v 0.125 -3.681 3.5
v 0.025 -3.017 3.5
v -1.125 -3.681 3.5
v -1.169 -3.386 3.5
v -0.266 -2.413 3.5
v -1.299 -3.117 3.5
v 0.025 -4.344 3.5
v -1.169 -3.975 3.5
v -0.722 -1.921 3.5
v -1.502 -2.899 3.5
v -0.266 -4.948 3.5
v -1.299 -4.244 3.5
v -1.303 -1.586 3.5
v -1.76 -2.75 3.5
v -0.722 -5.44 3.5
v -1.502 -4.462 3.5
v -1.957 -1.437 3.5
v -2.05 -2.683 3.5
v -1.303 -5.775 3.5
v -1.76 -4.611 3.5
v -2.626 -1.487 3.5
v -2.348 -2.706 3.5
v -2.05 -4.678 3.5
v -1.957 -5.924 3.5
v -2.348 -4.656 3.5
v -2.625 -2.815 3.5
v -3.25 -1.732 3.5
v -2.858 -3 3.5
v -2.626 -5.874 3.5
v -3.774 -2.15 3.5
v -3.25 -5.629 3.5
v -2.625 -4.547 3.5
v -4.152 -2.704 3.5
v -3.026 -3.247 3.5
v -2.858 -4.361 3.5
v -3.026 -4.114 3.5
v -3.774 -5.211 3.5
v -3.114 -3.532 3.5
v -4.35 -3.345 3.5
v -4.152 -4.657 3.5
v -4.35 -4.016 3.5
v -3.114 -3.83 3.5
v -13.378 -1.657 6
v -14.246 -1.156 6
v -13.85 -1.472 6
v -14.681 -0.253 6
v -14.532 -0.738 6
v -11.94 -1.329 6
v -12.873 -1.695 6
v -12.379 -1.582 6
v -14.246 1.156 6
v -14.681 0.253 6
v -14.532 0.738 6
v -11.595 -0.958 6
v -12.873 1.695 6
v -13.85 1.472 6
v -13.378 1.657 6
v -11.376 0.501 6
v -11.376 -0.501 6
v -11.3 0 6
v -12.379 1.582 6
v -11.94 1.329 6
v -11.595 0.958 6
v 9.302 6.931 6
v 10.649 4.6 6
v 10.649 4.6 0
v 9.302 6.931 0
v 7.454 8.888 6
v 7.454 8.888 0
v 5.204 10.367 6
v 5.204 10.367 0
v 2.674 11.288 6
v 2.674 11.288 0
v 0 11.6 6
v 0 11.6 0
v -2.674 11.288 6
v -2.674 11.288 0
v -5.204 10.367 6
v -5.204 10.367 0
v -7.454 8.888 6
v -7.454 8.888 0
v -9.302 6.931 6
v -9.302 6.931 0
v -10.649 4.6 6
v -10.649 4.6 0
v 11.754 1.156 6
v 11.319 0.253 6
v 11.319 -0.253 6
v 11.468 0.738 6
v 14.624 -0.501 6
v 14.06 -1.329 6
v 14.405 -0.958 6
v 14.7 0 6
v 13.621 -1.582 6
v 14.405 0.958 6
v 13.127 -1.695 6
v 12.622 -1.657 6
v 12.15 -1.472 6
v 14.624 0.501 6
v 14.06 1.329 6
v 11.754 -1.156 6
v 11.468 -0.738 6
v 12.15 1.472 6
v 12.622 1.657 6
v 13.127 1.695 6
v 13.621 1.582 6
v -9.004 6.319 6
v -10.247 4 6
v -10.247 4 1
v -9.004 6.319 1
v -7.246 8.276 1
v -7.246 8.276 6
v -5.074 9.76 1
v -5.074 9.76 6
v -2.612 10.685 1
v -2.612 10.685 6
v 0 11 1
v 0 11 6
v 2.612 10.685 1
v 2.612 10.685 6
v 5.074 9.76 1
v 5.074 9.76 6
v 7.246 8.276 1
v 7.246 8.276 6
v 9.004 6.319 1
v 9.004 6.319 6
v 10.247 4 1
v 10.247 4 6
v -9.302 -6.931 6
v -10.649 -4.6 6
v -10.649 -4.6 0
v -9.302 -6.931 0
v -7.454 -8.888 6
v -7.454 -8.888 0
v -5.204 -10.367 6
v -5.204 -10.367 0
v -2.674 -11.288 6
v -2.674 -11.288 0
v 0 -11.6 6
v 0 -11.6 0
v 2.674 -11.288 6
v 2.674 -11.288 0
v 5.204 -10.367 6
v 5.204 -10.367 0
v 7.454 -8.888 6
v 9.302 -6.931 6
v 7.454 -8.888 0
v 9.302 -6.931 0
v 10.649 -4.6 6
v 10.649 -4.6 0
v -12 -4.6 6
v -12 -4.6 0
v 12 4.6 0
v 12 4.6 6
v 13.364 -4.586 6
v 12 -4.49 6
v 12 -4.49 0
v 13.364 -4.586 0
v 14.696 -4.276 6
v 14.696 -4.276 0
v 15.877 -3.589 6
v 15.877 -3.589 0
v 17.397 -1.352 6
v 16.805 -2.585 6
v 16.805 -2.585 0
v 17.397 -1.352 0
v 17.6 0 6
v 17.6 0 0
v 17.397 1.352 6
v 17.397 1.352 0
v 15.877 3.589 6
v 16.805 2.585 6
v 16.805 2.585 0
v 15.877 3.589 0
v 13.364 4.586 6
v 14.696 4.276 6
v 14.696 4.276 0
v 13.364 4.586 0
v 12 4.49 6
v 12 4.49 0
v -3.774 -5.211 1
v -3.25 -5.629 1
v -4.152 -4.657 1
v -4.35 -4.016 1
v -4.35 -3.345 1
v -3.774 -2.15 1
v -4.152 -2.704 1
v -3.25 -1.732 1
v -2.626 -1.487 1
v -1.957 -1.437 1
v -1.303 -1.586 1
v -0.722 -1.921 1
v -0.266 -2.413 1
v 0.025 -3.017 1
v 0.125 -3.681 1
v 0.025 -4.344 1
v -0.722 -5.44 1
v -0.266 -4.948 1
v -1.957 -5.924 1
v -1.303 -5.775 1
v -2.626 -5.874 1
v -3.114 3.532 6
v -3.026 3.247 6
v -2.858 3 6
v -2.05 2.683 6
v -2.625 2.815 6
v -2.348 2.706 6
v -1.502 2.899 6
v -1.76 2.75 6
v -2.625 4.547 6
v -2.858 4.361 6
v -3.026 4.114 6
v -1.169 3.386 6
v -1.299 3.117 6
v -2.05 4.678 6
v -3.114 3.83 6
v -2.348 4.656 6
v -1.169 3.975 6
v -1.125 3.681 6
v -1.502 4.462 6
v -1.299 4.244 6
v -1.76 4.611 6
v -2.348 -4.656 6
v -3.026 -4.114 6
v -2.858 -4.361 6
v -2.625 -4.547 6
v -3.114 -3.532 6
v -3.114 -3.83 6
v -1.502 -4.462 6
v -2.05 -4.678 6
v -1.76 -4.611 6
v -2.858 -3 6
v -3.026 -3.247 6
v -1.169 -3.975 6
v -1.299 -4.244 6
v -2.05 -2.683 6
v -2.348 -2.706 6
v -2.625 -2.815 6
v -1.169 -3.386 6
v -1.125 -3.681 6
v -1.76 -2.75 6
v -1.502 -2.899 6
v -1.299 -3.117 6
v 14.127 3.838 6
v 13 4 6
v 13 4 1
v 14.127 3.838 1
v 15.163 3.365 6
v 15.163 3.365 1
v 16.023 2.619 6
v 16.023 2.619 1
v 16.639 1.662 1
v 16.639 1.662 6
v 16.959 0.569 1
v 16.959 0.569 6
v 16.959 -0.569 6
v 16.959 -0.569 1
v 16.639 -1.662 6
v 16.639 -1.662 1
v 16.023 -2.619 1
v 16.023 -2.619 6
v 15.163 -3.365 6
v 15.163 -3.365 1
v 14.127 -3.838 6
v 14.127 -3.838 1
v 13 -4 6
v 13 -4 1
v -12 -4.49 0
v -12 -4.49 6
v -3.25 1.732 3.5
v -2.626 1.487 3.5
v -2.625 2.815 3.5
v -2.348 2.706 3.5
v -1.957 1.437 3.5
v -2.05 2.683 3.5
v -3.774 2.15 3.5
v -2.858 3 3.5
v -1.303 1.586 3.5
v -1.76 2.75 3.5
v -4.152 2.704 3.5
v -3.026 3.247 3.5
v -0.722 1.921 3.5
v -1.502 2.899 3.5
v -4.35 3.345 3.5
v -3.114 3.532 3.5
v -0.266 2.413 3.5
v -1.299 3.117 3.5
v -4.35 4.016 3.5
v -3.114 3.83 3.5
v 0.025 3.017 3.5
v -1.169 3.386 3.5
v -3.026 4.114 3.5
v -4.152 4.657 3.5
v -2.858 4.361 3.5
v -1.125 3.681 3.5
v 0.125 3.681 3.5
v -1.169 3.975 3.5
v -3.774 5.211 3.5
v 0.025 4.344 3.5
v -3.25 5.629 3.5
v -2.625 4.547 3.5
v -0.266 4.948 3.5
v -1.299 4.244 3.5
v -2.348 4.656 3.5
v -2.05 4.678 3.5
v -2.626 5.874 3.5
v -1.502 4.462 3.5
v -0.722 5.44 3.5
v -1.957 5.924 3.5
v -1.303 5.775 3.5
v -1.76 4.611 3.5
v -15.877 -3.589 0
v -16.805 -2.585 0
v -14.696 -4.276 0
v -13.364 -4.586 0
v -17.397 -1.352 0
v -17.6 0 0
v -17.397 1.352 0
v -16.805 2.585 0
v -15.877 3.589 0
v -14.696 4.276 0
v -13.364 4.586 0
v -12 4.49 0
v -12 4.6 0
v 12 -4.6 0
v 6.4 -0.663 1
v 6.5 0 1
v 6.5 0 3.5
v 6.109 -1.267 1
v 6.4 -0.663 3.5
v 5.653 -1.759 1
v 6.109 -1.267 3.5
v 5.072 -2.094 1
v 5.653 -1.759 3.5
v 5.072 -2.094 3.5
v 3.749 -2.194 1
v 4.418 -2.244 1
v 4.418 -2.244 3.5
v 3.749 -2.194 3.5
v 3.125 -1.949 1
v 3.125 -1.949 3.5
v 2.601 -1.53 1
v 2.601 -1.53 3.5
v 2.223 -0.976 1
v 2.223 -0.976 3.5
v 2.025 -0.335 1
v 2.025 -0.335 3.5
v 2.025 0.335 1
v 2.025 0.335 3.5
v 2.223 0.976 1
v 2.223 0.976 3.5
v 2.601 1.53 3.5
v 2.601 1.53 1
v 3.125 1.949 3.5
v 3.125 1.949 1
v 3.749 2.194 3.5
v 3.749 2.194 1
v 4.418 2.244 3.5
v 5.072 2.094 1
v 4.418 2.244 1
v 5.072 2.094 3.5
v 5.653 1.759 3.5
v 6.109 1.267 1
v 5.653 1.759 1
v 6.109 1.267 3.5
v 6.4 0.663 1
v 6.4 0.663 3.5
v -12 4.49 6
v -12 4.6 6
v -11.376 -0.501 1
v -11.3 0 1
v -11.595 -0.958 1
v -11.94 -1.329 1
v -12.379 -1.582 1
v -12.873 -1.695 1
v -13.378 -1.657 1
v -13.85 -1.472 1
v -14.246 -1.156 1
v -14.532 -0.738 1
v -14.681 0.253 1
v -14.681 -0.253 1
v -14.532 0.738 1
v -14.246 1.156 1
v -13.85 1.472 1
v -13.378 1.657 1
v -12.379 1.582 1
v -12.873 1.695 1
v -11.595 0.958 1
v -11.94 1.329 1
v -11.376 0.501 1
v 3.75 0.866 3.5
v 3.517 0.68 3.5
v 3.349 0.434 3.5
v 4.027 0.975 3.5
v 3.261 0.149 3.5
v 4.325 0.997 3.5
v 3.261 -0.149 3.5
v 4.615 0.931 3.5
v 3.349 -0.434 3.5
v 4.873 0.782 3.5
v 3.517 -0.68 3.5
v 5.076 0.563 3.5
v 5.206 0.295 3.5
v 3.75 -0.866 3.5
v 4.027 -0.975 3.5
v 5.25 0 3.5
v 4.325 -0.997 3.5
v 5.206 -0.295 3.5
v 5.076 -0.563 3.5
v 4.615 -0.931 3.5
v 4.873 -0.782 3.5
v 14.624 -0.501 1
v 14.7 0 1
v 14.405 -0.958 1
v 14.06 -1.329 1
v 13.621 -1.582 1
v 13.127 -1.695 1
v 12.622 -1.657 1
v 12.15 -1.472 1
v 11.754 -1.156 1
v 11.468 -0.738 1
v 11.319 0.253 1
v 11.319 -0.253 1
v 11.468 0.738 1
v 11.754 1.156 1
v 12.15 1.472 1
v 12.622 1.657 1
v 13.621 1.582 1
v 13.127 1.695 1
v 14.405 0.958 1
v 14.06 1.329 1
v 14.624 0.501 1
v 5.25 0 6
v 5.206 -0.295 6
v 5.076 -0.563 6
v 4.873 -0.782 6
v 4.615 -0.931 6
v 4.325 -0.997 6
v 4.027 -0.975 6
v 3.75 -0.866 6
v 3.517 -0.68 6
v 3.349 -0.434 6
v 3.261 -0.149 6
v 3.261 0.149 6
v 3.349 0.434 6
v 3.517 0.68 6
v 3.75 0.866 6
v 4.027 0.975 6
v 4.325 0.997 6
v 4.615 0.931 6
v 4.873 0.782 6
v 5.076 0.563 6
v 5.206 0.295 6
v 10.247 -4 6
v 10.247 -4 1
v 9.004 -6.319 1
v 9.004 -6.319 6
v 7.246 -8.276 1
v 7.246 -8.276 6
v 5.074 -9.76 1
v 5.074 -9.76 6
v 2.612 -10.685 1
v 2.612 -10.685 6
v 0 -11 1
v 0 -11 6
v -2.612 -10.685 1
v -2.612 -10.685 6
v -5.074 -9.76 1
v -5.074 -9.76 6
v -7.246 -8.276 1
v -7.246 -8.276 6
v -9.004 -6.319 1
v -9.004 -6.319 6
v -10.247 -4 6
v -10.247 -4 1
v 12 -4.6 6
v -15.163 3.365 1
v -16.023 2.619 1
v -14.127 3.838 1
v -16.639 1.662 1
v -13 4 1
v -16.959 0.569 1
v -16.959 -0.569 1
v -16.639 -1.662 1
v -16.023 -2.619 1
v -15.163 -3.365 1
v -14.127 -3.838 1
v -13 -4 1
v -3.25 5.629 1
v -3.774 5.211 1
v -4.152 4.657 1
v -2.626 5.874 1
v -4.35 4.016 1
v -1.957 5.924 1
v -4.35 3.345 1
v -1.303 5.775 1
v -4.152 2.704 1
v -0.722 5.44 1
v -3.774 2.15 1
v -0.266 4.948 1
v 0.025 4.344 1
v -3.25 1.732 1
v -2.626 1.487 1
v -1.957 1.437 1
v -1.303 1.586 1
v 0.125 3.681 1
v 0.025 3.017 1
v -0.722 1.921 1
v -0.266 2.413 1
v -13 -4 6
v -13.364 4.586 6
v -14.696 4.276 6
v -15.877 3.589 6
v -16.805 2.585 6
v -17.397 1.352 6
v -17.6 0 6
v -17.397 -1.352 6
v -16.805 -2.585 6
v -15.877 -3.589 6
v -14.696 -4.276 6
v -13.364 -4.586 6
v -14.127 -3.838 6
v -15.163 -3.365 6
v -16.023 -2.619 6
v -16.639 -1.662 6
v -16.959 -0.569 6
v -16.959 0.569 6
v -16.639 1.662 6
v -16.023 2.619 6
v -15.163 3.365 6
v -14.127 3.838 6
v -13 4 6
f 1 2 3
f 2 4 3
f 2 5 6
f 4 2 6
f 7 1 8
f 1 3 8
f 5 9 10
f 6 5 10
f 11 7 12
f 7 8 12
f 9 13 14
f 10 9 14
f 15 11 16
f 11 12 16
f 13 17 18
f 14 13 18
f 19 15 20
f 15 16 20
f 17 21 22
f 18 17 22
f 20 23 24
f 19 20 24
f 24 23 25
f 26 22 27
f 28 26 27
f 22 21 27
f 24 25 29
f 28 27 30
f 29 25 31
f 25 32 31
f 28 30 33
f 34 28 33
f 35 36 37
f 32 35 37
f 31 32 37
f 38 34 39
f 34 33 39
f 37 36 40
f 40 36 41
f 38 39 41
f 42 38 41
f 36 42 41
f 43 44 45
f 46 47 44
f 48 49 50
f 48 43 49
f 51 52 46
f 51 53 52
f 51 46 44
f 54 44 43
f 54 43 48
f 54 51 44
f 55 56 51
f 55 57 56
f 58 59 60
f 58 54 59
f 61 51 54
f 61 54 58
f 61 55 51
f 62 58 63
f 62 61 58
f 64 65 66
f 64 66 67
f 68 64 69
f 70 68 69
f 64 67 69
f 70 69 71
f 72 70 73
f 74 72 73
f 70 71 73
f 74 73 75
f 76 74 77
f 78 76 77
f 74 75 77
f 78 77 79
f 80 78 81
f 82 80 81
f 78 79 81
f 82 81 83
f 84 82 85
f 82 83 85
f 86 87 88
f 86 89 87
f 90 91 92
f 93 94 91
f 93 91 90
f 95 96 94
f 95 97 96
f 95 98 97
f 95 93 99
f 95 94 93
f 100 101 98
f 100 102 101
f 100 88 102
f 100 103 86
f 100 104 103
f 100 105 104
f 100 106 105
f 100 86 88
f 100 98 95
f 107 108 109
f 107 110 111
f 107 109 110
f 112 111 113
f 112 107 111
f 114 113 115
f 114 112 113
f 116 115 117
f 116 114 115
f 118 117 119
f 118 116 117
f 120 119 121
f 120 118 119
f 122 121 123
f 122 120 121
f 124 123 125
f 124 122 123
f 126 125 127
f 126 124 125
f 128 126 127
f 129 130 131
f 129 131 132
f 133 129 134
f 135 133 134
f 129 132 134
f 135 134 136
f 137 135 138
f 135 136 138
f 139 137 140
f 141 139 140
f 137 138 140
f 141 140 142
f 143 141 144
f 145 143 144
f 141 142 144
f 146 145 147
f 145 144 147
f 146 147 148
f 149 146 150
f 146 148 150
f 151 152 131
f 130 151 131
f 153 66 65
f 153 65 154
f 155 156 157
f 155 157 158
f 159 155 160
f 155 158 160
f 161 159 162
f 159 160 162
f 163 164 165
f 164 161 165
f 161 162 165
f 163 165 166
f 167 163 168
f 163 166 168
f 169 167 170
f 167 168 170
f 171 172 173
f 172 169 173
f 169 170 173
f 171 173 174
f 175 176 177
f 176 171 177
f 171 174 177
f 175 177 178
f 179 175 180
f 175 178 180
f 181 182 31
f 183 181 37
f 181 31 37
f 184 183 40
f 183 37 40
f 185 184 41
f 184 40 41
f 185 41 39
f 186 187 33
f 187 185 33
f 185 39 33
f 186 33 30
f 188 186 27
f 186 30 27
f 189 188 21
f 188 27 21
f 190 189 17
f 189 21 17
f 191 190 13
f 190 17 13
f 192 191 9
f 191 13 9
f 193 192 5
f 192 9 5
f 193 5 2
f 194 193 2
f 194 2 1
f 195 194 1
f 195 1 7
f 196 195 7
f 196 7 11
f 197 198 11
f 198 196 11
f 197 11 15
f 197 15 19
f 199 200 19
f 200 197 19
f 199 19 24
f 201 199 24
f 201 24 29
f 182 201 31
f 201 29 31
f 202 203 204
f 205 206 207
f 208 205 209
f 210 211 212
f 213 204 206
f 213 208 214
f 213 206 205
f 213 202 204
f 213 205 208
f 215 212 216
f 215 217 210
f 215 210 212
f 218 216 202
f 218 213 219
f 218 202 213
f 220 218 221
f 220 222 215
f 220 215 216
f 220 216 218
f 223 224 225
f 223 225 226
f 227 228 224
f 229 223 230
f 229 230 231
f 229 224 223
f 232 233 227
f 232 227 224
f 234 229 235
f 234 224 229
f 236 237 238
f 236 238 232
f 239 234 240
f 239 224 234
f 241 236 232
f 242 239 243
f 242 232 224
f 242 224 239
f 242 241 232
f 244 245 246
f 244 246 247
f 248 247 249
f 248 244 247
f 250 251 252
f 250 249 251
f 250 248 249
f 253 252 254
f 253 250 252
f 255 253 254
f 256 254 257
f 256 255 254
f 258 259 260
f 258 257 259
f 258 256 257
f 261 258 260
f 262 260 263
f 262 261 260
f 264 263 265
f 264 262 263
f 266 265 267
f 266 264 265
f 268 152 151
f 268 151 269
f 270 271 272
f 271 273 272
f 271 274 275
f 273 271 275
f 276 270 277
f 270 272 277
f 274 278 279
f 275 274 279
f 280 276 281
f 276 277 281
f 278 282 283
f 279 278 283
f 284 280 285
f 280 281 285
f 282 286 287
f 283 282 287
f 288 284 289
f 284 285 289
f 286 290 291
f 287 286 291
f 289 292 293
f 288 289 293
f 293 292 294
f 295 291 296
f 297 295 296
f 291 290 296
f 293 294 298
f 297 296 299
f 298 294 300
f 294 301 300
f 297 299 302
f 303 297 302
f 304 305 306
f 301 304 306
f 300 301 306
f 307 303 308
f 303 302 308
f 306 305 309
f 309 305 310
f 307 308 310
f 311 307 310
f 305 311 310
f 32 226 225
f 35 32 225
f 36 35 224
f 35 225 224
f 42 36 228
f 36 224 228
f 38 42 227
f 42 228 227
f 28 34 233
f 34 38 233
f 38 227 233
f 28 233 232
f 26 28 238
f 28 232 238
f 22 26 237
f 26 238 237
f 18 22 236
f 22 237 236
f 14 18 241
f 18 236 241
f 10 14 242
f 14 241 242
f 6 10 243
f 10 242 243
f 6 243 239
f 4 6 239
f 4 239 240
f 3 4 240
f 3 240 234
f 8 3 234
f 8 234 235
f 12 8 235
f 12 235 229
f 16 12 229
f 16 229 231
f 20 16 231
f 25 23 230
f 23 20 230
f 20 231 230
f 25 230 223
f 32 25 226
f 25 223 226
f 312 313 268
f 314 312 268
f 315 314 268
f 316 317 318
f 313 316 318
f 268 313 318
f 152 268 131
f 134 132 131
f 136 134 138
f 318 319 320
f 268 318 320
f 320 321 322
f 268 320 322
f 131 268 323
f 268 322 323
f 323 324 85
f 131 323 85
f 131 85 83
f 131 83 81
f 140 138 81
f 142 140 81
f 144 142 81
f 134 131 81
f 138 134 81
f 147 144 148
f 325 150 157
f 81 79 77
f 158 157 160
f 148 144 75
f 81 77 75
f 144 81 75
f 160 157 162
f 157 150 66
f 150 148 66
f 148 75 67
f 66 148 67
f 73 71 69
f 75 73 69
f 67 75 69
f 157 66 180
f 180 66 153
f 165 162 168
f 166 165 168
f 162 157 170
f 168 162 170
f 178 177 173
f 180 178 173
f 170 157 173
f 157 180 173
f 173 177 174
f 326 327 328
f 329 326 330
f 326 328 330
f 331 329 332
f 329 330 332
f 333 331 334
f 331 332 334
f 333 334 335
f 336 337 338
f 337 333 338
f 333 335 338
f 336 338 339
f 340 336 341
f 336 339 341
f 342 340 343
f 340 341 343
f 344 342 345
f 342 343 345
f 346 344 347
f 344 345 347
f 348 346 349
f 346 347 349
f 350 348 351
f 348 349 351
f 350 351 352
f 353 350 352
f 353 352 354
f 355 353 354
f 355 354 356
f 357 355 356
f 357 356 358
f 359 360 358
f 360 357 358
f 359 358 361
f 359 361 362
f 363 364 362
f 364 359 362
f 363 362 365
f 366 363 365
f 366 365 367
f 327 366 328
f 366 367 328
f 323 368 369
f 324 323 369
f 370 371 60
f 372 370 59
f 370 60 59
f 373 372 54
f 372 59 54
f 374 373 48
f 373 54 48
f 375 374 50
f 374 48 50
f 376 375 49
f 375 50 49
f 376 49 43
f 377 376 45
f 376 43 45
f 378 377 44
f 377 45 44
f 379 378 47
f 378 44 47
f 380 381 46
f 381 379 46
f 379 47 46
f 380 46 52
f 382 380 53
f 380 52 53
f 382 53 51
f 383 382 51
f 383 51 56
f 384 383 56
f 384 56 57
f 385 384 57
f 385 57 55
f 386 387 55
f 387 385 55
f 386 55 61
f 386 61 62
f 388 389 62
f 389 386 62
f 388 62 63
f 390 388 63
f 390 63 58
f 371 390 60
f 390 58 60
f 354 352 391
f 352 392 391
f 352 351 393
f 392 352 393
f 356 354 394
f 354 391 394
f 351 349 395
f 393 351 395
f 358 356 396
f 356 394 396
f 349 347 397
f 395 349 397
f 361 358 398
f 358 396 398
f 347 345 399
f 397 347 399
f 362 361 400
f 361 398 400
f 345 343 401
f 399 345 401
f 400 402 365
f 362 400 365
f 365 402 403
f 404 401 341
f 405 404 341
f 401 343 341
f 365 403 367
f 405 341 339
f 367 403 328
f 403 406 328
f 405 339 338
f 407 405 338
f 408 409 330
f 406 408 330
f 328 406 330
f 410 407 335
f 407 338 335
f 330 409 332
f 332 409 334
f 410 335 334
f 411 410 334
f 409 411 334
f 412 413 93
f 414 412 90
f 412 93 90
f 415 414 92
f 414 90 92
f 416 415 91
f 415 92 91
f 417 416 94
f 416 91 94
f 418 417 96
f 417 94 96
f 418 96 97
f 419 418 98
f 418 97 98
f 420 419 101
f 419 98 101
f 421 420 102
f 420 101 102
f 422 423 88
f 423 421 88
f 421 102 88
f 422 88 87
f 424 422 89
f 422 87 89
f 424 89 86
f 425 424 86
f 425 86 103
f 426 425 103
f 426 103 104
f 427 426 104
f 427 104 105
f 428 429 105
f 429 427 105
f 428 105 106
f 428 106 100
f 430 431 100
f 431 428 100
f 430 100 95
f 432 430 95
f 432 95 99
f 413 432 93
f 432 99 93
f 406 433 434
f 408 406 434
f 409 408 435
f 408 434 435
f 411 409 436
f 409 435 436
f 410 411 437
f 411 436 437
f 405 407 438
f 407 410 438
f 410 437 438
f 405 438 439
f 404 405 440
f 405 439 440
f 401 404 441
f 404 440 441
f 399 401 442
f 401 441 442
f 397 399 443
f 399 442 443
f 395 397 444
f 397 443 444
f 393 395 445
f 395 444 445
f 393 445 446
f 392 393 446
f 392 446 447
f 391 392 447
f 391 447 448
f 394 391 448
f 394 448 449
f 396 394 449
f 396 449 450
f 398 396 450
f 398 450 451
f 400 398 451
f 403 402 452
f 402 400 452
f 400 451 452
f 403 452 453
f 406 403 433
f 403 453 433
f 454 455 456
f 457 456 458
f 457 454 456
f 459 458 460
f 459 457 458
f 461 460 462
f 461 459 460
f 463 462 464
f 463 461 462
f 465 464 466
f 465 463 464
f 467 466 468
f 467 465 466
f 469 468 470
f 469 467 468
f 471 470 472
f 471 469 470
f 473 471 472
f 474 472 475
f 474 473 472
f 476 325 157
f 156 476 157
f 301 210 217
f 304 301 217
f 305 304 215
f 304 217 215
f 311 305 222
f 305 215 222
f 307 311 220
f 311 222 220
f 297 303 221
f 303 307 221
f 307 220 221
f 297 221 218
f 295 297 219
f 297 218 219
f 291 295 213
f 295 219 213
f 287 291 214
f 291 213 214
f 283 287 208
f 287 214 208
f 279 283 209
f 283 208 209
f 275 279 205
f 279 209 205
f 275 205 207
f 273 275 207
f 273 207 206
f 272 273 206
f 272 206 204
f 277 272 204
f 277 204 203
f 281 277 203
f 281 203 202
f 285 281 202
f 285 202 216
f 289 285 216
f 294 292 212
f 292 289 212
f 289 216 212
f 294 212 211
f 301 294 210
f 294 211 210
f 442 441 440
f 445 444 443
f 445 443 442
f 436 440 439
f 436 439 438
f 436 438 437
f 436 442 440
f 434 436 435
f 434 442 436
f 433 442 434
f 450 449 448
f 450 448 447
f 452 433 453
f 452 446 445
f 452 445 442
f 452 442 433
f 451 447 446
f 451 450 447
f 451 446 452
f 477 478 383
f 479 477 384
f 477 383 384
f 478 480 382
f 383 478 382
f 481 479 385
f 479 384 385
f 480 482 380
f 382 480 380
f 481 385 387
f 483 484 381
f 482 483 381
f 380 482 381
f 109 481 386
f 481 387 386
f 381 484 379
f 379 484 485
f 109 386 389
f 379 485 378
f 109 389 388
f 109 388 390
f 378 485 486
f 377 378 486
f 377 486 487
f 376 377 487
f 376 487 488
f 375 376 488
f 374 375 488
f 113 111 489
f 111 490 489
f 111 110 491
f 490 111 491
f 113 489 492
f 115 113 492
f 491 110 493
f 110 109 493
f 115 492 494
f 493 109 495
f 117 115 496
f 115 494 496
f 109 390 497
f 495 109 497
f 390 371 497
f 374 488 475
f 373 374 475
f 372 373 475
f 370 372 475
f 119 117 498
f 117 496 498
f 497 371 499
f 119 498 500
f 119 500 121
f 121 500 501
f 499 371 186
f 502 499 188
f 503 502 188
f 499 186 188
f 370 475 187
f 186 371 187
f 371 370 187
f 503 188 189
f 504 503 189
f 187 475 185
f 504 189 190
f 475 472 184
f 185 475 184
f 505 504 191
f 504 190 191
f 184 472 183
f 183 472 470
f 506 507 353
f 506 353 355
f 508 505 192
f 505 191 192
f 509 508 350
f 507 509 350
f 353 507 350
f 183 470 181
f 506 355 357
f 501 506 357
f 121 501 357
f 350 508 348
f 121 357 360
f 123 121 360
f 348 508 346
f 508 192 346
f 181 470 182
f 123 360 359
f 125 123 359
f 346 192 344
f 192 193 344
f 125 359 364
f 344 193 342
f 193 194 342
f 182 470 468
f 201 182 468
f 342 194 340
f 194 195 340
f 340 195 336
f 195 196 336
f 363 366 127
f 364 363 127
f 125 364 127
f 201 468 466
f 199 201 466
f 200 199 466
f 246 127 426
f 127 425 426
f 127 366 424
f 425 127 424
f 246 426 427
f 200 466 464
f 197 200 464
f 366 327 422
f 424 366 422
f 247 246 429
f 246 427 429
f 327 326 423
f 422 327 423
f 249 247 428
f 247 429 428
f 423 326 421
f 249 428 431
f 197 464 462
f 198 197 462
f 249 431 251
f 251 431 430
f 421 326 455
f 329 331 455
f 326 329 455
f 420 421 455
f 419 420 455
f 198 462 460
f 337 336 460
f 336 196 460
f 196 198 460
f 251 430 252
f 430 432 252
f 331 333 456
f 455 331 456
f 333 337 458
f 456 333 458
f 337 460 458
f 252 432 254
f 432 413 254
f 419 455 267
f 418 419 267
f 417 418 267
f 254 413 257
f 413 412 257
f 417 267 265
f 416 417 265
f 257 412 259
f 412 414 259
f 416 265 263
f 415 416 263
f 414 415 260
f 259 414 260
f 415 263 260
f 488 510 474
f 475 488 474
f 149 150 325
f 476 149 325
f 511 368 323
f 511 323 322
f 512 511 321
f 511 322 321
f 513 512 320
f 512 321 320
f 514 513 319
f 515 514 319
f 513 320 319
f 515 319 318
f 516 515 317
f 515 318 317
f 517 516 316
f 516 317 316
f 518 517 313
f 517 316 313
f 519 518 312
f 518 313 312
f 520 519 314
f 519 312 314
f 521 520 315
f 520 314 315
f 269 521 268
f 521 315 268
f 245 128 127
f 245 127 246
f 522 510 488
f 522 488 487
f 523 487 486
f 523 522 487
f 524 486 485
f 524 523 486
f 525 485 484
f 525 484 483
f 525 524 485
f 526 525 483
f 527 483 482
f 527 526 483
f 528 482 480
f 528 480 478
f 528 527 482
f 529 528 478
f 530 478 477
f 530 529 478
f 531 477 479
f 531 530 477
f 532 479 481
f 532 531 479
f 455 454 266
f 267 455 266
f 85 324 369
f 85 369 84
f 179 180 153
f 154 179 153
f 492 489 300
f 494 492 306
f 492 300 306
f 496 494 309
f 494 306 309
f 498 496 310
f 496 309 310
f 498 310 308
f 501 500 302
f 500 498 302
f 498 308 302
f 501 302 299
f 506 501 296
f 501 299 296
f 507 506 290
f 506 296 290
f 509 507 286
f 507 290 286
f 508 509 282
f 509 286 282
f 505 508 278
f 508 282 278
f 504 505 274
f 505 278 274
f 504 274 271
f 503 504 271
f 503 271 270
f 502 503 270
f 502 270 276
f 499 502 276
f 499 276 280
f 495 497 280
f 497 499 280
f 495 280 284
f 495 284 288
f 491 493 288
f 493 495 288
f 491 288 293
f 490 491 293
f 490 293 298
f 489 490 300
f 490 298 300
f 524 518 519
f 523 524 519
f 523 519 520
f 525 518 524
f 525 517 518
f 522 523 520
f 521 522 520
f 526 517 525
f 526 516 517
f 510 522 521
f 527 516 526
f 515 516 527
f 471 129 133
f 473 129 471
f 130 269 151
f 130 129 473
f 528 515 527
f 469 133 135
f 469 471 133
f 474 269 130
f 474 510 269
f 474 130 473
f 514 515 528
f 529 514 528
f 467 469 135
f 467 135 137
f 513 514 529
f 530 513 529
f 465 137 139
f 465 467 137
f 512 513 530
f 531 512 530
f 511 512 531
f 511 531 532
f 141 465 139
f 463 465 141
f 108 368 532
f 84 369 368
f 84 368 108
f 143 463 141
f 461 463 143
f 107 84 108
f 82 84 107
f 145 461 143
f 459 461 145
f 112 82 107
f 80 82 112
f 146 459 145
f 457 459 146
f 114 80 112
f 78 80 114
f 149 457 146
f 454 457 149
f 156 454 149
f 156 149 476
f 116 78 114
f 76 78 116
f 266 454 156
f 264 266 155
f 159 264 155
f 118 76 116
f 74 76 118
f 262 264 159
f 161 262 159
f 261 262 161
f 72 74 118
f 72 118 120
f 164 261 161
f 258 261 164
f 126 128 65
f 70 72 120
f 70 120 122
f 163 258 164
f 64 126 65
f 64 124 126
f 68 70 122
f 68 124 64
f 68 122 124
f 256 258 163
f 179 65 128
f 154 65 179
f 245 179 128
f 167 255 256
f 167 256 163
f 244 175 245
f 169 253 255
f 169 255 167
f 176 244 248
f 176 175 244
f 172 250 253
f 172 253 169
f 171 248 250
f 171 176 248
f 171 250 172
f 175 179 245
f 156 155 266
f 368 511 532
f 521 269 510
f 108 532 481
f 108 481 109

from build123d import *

# Parameters (mm, degrees)
CYLINDER150_R       = 1.7
CYLINDER150_DEPTH   = 11
CYLINDER151_R       = 1.7
CYLINDER151_DEPTH   = 11
CYLINDER157_R       = 2.25
CYLINDER157_DEPTH   = 8
CYLINDER156_R       = 1
CYLINDER156_DEPTH   = 5
CYLINDER147_R       = 1
CYLINDER147_DEPTH   = 1
ARRAY_COUNT         = 3
BOX_W               = 3
BOX_H               = 8
BOX_DEPTH           = 5
CYLINDER153_R       = 11
CYLINDER153_DEPTH   = 5
BOX001_W            = 3
BOX001_H            = 8
BOX001_DEPTH        = 5
CYLINDER158_R       = 4
CYLINDER158_DEPTH   = 5
CYLINDER_R          = 4
CYLINDER_DEPTH      = 5
CUT_PLACEMENT_ANGLE = 180
BOX008_W            = 2
BOX008_H            = 9.2
BOX008_DEPTH        = 6
CYLINDER198_R       = 11.6
CYLINDER198_DEPTH   = 6
CYLINDER199_R       = 4.6
CYLINDER199_DEPTH   = 6
CYLINDER200_R       = 4.6
CYLINDER200_DEPTH   = 6
BOX009_W            = 2
BOX009_H            = 9.2
BOX009_DEPTH        = 6


with BuildPart() as wirefeedsmount1:
    # Cylinder150 → Cylinder150 (new body)
    with BuildSketch(Plane(origin=(-13, 0, 0), x_dir=(1, 0, 0), z_dir=(0, 0, 1))):
        Circle(CYLINDER150_R)
    extrude(amount=CYLINDER150_DEPTH)


with BuildPart() as wirefeedsmount002:
    # Cylinder151 → Cylinder151 (new body)
    with BuildSketch(Plane(origin=(13, 0, 0), x_dir=(1, 0, 0), z_dir=(0, 0, 1))):
        Circle(CYLINDER151_R)
    extrude(amount=CYLINDER151_DEPTH)


with BuildPart() as sealsubtraction:
    # Cylinder157 → Cylinder157 (new body)
    with BuildSketch(Plane.XY.offset(2.5)):
        Circle(CYLINDER157_R)
    extrude(amount=CYLINDER157_DEPTH)


with BuildPart() as bottomwireoutlet:
    # Cylinder156 → Cylinder156 (new body)
    with BuildSketch(Plane.XY.offset(-2)):
        Circle(CYLINDER156_R)
    extrude(amount=CYLINDER156_DEPTH)


with BuildPart() as fusion013:
    # Cylinder147 → Cylinder147 (new body)
    with BuildSketch(Plane.XY.offset(4.5)):
        Circle(CYLINDER147_R)
    extrude(amount=CYLINDER147_DEPTH)

    # Fusion: union SealSubtraction, BottomWireOutlet
    add(sealsubtraction.part)
    add(bottomwireoutlet.part)


with BuildPart() as fusion013_1:
    # Fusion placement: moved
    add(fusion013.part.moved(Location((4.25, 0, 0))))

    # Array: Fusion013 ×3 about axis
    array_axis = Axis((0, 0, 0), (0, 0, 1))


with BuildPart() as fusion013_2:
    add(fusion013_1.part)
    for i in range(1, ARRAY_COUNT):
        add(fusion013_1.part.rotate(array_axis, i * 360 / ARRAY_COUNT))

    # Fusion013: union WireFeedsMount1, WireFeedsMount002
    add(wirefeedsmount1.part)
    add(wirefeedsmount002.part)


with BuildPart() as mountcube1:
    # Box → Box (new body)
    with BuildSketch(Plane(origin=(-13, -4, 0), x_dir=(1, 0, 0), z_dir=(0, 0, 1))):
        with Locations((1.5, 4)):
            Rectangle(BOX_W, BOX_H)
    extrude(amount=BOX_DEPTH)


with BuildPart() as body:
    # Cylinder153 → Cylinder153 (new body)
    with BuildSketch(Plane.XY):
        Circle(CYLINDER153_R)
    extrude(amount=CYLINDER153_DEPTH)


with BuildPart() as mountcube002:
    # Box001 → Box001 (new body)
    with BuildSketch(Plane(origin=(10, -4, 0), x_dir=(1, 0, 0), z_dir=(0, 0, 1))):
        with Locations((1.5, 4)):
            Rectangle(BOX001_W, BOX001_H)
    extrude(amount=BOX001_DEPTH)


with BuildPart() as mountflange002:
    # Cylinder158 → Cylinder158 (new body)
    with BuildSketch(Plane(origin=(13, 0, 0), x_dir=(1, 0, 0), z_dir=(0, 0, 1))):
        Circle(CYLINDER158_R)
    extrude(amount=CYLINDER158_DEPTH)


with BuildPart() as cut:
    # Cylinder → Cylinder (new body)
    with BuildSketch(Plane(origin=(-13, 0, 0), x_dir=(1, 0, 0), z_dir=(0, 0, 1))):
        Circle(CYLINDER_R)
    extrude(amount=CYLINDER_DEPTH)

    # Fusion012: union MountCube1, Body, MountCube002, MountFlange002
    add(mountcube1.part)
    add(body.part)
    add(mountcube002.part)
    add(mountflange002.part)

    # Cut: cut Fusion013
    add(fusion013_2.part, mode=Mode.SUBTRACT)


with BuildPart() as cut_1:
    # Cut placement: moved
    add(cut.part.moved(Location((0, 0, 6))).rotate(Axis((0, 0, 6), (1, 0, 0)), CUT_PLACEMENT_ANGLE))


with BuildPart() as cube:
    # Box008 → Box008 (new body)
    with BuildSketch(Plane(origin=(-12, -4.6, 0), x_dir=(1, 0, 0), z_dir=(0, 0, 1))):
        with Locations((1, 4.6)):
            Rectangle(BOX008_W, BOX008_H)
    extrude(amount=BOX008_DEPTH)


with BuildPart() as cylinder:
    # Cylinder198 → Cylinder198 (new body)
    with BuildSketch(Plane.XY):
        Circle(CYLINDER198_R)
    extrude(amount=CYLINDER198_DEPTH)


with BuildPart() as cylinder016:
    # Cylinder199 → Cylinder199 (new body)
    with BuildSketch(Plane(origin=(-13, 0, 0), x_dir=(1, 0, 0), z_dir=(0, 0, 1))):
        Circle(CYLINDER199_R)
    extrude(amount=CYLINDER199_DEPTH)


with BuildPart() as cylinder017:
    # Cylinder200 → Cylinder200 (new body)
    with BuildSketch(Plane(origin=(13, 0, 0), x_dir=(1, 0, 0), z_dir=(0, 0, 1))):
        Circle(CYLINDER200_R)
    extrude(amount=CYLINDER200_DEPTH)


with BuildPart() as cut027:
    # Box009 → Box009 (new body)
    with BuildSketch(Plane(origin=(10, -4.6, 0), x_dir=(1, 0, 0), z_dir=(0, 0, 1))):
        with Locations((1, 4.6)):
            Rectangle(BOX009_W, BOX009_H)
    extrude(amount=BOX009_DEPTH)

    # Fusion014: union Cube, Cylinder, Cylinder016, Cylinder017
    add(cube.part)
    add(cylinder.part)
    add(cylinder016.part)
    add(cylinder017.part)

    # Cut027: cut Cut
    add(cut_1.part, mode=Mode.SUBTRACT)


solid = cut027.part
